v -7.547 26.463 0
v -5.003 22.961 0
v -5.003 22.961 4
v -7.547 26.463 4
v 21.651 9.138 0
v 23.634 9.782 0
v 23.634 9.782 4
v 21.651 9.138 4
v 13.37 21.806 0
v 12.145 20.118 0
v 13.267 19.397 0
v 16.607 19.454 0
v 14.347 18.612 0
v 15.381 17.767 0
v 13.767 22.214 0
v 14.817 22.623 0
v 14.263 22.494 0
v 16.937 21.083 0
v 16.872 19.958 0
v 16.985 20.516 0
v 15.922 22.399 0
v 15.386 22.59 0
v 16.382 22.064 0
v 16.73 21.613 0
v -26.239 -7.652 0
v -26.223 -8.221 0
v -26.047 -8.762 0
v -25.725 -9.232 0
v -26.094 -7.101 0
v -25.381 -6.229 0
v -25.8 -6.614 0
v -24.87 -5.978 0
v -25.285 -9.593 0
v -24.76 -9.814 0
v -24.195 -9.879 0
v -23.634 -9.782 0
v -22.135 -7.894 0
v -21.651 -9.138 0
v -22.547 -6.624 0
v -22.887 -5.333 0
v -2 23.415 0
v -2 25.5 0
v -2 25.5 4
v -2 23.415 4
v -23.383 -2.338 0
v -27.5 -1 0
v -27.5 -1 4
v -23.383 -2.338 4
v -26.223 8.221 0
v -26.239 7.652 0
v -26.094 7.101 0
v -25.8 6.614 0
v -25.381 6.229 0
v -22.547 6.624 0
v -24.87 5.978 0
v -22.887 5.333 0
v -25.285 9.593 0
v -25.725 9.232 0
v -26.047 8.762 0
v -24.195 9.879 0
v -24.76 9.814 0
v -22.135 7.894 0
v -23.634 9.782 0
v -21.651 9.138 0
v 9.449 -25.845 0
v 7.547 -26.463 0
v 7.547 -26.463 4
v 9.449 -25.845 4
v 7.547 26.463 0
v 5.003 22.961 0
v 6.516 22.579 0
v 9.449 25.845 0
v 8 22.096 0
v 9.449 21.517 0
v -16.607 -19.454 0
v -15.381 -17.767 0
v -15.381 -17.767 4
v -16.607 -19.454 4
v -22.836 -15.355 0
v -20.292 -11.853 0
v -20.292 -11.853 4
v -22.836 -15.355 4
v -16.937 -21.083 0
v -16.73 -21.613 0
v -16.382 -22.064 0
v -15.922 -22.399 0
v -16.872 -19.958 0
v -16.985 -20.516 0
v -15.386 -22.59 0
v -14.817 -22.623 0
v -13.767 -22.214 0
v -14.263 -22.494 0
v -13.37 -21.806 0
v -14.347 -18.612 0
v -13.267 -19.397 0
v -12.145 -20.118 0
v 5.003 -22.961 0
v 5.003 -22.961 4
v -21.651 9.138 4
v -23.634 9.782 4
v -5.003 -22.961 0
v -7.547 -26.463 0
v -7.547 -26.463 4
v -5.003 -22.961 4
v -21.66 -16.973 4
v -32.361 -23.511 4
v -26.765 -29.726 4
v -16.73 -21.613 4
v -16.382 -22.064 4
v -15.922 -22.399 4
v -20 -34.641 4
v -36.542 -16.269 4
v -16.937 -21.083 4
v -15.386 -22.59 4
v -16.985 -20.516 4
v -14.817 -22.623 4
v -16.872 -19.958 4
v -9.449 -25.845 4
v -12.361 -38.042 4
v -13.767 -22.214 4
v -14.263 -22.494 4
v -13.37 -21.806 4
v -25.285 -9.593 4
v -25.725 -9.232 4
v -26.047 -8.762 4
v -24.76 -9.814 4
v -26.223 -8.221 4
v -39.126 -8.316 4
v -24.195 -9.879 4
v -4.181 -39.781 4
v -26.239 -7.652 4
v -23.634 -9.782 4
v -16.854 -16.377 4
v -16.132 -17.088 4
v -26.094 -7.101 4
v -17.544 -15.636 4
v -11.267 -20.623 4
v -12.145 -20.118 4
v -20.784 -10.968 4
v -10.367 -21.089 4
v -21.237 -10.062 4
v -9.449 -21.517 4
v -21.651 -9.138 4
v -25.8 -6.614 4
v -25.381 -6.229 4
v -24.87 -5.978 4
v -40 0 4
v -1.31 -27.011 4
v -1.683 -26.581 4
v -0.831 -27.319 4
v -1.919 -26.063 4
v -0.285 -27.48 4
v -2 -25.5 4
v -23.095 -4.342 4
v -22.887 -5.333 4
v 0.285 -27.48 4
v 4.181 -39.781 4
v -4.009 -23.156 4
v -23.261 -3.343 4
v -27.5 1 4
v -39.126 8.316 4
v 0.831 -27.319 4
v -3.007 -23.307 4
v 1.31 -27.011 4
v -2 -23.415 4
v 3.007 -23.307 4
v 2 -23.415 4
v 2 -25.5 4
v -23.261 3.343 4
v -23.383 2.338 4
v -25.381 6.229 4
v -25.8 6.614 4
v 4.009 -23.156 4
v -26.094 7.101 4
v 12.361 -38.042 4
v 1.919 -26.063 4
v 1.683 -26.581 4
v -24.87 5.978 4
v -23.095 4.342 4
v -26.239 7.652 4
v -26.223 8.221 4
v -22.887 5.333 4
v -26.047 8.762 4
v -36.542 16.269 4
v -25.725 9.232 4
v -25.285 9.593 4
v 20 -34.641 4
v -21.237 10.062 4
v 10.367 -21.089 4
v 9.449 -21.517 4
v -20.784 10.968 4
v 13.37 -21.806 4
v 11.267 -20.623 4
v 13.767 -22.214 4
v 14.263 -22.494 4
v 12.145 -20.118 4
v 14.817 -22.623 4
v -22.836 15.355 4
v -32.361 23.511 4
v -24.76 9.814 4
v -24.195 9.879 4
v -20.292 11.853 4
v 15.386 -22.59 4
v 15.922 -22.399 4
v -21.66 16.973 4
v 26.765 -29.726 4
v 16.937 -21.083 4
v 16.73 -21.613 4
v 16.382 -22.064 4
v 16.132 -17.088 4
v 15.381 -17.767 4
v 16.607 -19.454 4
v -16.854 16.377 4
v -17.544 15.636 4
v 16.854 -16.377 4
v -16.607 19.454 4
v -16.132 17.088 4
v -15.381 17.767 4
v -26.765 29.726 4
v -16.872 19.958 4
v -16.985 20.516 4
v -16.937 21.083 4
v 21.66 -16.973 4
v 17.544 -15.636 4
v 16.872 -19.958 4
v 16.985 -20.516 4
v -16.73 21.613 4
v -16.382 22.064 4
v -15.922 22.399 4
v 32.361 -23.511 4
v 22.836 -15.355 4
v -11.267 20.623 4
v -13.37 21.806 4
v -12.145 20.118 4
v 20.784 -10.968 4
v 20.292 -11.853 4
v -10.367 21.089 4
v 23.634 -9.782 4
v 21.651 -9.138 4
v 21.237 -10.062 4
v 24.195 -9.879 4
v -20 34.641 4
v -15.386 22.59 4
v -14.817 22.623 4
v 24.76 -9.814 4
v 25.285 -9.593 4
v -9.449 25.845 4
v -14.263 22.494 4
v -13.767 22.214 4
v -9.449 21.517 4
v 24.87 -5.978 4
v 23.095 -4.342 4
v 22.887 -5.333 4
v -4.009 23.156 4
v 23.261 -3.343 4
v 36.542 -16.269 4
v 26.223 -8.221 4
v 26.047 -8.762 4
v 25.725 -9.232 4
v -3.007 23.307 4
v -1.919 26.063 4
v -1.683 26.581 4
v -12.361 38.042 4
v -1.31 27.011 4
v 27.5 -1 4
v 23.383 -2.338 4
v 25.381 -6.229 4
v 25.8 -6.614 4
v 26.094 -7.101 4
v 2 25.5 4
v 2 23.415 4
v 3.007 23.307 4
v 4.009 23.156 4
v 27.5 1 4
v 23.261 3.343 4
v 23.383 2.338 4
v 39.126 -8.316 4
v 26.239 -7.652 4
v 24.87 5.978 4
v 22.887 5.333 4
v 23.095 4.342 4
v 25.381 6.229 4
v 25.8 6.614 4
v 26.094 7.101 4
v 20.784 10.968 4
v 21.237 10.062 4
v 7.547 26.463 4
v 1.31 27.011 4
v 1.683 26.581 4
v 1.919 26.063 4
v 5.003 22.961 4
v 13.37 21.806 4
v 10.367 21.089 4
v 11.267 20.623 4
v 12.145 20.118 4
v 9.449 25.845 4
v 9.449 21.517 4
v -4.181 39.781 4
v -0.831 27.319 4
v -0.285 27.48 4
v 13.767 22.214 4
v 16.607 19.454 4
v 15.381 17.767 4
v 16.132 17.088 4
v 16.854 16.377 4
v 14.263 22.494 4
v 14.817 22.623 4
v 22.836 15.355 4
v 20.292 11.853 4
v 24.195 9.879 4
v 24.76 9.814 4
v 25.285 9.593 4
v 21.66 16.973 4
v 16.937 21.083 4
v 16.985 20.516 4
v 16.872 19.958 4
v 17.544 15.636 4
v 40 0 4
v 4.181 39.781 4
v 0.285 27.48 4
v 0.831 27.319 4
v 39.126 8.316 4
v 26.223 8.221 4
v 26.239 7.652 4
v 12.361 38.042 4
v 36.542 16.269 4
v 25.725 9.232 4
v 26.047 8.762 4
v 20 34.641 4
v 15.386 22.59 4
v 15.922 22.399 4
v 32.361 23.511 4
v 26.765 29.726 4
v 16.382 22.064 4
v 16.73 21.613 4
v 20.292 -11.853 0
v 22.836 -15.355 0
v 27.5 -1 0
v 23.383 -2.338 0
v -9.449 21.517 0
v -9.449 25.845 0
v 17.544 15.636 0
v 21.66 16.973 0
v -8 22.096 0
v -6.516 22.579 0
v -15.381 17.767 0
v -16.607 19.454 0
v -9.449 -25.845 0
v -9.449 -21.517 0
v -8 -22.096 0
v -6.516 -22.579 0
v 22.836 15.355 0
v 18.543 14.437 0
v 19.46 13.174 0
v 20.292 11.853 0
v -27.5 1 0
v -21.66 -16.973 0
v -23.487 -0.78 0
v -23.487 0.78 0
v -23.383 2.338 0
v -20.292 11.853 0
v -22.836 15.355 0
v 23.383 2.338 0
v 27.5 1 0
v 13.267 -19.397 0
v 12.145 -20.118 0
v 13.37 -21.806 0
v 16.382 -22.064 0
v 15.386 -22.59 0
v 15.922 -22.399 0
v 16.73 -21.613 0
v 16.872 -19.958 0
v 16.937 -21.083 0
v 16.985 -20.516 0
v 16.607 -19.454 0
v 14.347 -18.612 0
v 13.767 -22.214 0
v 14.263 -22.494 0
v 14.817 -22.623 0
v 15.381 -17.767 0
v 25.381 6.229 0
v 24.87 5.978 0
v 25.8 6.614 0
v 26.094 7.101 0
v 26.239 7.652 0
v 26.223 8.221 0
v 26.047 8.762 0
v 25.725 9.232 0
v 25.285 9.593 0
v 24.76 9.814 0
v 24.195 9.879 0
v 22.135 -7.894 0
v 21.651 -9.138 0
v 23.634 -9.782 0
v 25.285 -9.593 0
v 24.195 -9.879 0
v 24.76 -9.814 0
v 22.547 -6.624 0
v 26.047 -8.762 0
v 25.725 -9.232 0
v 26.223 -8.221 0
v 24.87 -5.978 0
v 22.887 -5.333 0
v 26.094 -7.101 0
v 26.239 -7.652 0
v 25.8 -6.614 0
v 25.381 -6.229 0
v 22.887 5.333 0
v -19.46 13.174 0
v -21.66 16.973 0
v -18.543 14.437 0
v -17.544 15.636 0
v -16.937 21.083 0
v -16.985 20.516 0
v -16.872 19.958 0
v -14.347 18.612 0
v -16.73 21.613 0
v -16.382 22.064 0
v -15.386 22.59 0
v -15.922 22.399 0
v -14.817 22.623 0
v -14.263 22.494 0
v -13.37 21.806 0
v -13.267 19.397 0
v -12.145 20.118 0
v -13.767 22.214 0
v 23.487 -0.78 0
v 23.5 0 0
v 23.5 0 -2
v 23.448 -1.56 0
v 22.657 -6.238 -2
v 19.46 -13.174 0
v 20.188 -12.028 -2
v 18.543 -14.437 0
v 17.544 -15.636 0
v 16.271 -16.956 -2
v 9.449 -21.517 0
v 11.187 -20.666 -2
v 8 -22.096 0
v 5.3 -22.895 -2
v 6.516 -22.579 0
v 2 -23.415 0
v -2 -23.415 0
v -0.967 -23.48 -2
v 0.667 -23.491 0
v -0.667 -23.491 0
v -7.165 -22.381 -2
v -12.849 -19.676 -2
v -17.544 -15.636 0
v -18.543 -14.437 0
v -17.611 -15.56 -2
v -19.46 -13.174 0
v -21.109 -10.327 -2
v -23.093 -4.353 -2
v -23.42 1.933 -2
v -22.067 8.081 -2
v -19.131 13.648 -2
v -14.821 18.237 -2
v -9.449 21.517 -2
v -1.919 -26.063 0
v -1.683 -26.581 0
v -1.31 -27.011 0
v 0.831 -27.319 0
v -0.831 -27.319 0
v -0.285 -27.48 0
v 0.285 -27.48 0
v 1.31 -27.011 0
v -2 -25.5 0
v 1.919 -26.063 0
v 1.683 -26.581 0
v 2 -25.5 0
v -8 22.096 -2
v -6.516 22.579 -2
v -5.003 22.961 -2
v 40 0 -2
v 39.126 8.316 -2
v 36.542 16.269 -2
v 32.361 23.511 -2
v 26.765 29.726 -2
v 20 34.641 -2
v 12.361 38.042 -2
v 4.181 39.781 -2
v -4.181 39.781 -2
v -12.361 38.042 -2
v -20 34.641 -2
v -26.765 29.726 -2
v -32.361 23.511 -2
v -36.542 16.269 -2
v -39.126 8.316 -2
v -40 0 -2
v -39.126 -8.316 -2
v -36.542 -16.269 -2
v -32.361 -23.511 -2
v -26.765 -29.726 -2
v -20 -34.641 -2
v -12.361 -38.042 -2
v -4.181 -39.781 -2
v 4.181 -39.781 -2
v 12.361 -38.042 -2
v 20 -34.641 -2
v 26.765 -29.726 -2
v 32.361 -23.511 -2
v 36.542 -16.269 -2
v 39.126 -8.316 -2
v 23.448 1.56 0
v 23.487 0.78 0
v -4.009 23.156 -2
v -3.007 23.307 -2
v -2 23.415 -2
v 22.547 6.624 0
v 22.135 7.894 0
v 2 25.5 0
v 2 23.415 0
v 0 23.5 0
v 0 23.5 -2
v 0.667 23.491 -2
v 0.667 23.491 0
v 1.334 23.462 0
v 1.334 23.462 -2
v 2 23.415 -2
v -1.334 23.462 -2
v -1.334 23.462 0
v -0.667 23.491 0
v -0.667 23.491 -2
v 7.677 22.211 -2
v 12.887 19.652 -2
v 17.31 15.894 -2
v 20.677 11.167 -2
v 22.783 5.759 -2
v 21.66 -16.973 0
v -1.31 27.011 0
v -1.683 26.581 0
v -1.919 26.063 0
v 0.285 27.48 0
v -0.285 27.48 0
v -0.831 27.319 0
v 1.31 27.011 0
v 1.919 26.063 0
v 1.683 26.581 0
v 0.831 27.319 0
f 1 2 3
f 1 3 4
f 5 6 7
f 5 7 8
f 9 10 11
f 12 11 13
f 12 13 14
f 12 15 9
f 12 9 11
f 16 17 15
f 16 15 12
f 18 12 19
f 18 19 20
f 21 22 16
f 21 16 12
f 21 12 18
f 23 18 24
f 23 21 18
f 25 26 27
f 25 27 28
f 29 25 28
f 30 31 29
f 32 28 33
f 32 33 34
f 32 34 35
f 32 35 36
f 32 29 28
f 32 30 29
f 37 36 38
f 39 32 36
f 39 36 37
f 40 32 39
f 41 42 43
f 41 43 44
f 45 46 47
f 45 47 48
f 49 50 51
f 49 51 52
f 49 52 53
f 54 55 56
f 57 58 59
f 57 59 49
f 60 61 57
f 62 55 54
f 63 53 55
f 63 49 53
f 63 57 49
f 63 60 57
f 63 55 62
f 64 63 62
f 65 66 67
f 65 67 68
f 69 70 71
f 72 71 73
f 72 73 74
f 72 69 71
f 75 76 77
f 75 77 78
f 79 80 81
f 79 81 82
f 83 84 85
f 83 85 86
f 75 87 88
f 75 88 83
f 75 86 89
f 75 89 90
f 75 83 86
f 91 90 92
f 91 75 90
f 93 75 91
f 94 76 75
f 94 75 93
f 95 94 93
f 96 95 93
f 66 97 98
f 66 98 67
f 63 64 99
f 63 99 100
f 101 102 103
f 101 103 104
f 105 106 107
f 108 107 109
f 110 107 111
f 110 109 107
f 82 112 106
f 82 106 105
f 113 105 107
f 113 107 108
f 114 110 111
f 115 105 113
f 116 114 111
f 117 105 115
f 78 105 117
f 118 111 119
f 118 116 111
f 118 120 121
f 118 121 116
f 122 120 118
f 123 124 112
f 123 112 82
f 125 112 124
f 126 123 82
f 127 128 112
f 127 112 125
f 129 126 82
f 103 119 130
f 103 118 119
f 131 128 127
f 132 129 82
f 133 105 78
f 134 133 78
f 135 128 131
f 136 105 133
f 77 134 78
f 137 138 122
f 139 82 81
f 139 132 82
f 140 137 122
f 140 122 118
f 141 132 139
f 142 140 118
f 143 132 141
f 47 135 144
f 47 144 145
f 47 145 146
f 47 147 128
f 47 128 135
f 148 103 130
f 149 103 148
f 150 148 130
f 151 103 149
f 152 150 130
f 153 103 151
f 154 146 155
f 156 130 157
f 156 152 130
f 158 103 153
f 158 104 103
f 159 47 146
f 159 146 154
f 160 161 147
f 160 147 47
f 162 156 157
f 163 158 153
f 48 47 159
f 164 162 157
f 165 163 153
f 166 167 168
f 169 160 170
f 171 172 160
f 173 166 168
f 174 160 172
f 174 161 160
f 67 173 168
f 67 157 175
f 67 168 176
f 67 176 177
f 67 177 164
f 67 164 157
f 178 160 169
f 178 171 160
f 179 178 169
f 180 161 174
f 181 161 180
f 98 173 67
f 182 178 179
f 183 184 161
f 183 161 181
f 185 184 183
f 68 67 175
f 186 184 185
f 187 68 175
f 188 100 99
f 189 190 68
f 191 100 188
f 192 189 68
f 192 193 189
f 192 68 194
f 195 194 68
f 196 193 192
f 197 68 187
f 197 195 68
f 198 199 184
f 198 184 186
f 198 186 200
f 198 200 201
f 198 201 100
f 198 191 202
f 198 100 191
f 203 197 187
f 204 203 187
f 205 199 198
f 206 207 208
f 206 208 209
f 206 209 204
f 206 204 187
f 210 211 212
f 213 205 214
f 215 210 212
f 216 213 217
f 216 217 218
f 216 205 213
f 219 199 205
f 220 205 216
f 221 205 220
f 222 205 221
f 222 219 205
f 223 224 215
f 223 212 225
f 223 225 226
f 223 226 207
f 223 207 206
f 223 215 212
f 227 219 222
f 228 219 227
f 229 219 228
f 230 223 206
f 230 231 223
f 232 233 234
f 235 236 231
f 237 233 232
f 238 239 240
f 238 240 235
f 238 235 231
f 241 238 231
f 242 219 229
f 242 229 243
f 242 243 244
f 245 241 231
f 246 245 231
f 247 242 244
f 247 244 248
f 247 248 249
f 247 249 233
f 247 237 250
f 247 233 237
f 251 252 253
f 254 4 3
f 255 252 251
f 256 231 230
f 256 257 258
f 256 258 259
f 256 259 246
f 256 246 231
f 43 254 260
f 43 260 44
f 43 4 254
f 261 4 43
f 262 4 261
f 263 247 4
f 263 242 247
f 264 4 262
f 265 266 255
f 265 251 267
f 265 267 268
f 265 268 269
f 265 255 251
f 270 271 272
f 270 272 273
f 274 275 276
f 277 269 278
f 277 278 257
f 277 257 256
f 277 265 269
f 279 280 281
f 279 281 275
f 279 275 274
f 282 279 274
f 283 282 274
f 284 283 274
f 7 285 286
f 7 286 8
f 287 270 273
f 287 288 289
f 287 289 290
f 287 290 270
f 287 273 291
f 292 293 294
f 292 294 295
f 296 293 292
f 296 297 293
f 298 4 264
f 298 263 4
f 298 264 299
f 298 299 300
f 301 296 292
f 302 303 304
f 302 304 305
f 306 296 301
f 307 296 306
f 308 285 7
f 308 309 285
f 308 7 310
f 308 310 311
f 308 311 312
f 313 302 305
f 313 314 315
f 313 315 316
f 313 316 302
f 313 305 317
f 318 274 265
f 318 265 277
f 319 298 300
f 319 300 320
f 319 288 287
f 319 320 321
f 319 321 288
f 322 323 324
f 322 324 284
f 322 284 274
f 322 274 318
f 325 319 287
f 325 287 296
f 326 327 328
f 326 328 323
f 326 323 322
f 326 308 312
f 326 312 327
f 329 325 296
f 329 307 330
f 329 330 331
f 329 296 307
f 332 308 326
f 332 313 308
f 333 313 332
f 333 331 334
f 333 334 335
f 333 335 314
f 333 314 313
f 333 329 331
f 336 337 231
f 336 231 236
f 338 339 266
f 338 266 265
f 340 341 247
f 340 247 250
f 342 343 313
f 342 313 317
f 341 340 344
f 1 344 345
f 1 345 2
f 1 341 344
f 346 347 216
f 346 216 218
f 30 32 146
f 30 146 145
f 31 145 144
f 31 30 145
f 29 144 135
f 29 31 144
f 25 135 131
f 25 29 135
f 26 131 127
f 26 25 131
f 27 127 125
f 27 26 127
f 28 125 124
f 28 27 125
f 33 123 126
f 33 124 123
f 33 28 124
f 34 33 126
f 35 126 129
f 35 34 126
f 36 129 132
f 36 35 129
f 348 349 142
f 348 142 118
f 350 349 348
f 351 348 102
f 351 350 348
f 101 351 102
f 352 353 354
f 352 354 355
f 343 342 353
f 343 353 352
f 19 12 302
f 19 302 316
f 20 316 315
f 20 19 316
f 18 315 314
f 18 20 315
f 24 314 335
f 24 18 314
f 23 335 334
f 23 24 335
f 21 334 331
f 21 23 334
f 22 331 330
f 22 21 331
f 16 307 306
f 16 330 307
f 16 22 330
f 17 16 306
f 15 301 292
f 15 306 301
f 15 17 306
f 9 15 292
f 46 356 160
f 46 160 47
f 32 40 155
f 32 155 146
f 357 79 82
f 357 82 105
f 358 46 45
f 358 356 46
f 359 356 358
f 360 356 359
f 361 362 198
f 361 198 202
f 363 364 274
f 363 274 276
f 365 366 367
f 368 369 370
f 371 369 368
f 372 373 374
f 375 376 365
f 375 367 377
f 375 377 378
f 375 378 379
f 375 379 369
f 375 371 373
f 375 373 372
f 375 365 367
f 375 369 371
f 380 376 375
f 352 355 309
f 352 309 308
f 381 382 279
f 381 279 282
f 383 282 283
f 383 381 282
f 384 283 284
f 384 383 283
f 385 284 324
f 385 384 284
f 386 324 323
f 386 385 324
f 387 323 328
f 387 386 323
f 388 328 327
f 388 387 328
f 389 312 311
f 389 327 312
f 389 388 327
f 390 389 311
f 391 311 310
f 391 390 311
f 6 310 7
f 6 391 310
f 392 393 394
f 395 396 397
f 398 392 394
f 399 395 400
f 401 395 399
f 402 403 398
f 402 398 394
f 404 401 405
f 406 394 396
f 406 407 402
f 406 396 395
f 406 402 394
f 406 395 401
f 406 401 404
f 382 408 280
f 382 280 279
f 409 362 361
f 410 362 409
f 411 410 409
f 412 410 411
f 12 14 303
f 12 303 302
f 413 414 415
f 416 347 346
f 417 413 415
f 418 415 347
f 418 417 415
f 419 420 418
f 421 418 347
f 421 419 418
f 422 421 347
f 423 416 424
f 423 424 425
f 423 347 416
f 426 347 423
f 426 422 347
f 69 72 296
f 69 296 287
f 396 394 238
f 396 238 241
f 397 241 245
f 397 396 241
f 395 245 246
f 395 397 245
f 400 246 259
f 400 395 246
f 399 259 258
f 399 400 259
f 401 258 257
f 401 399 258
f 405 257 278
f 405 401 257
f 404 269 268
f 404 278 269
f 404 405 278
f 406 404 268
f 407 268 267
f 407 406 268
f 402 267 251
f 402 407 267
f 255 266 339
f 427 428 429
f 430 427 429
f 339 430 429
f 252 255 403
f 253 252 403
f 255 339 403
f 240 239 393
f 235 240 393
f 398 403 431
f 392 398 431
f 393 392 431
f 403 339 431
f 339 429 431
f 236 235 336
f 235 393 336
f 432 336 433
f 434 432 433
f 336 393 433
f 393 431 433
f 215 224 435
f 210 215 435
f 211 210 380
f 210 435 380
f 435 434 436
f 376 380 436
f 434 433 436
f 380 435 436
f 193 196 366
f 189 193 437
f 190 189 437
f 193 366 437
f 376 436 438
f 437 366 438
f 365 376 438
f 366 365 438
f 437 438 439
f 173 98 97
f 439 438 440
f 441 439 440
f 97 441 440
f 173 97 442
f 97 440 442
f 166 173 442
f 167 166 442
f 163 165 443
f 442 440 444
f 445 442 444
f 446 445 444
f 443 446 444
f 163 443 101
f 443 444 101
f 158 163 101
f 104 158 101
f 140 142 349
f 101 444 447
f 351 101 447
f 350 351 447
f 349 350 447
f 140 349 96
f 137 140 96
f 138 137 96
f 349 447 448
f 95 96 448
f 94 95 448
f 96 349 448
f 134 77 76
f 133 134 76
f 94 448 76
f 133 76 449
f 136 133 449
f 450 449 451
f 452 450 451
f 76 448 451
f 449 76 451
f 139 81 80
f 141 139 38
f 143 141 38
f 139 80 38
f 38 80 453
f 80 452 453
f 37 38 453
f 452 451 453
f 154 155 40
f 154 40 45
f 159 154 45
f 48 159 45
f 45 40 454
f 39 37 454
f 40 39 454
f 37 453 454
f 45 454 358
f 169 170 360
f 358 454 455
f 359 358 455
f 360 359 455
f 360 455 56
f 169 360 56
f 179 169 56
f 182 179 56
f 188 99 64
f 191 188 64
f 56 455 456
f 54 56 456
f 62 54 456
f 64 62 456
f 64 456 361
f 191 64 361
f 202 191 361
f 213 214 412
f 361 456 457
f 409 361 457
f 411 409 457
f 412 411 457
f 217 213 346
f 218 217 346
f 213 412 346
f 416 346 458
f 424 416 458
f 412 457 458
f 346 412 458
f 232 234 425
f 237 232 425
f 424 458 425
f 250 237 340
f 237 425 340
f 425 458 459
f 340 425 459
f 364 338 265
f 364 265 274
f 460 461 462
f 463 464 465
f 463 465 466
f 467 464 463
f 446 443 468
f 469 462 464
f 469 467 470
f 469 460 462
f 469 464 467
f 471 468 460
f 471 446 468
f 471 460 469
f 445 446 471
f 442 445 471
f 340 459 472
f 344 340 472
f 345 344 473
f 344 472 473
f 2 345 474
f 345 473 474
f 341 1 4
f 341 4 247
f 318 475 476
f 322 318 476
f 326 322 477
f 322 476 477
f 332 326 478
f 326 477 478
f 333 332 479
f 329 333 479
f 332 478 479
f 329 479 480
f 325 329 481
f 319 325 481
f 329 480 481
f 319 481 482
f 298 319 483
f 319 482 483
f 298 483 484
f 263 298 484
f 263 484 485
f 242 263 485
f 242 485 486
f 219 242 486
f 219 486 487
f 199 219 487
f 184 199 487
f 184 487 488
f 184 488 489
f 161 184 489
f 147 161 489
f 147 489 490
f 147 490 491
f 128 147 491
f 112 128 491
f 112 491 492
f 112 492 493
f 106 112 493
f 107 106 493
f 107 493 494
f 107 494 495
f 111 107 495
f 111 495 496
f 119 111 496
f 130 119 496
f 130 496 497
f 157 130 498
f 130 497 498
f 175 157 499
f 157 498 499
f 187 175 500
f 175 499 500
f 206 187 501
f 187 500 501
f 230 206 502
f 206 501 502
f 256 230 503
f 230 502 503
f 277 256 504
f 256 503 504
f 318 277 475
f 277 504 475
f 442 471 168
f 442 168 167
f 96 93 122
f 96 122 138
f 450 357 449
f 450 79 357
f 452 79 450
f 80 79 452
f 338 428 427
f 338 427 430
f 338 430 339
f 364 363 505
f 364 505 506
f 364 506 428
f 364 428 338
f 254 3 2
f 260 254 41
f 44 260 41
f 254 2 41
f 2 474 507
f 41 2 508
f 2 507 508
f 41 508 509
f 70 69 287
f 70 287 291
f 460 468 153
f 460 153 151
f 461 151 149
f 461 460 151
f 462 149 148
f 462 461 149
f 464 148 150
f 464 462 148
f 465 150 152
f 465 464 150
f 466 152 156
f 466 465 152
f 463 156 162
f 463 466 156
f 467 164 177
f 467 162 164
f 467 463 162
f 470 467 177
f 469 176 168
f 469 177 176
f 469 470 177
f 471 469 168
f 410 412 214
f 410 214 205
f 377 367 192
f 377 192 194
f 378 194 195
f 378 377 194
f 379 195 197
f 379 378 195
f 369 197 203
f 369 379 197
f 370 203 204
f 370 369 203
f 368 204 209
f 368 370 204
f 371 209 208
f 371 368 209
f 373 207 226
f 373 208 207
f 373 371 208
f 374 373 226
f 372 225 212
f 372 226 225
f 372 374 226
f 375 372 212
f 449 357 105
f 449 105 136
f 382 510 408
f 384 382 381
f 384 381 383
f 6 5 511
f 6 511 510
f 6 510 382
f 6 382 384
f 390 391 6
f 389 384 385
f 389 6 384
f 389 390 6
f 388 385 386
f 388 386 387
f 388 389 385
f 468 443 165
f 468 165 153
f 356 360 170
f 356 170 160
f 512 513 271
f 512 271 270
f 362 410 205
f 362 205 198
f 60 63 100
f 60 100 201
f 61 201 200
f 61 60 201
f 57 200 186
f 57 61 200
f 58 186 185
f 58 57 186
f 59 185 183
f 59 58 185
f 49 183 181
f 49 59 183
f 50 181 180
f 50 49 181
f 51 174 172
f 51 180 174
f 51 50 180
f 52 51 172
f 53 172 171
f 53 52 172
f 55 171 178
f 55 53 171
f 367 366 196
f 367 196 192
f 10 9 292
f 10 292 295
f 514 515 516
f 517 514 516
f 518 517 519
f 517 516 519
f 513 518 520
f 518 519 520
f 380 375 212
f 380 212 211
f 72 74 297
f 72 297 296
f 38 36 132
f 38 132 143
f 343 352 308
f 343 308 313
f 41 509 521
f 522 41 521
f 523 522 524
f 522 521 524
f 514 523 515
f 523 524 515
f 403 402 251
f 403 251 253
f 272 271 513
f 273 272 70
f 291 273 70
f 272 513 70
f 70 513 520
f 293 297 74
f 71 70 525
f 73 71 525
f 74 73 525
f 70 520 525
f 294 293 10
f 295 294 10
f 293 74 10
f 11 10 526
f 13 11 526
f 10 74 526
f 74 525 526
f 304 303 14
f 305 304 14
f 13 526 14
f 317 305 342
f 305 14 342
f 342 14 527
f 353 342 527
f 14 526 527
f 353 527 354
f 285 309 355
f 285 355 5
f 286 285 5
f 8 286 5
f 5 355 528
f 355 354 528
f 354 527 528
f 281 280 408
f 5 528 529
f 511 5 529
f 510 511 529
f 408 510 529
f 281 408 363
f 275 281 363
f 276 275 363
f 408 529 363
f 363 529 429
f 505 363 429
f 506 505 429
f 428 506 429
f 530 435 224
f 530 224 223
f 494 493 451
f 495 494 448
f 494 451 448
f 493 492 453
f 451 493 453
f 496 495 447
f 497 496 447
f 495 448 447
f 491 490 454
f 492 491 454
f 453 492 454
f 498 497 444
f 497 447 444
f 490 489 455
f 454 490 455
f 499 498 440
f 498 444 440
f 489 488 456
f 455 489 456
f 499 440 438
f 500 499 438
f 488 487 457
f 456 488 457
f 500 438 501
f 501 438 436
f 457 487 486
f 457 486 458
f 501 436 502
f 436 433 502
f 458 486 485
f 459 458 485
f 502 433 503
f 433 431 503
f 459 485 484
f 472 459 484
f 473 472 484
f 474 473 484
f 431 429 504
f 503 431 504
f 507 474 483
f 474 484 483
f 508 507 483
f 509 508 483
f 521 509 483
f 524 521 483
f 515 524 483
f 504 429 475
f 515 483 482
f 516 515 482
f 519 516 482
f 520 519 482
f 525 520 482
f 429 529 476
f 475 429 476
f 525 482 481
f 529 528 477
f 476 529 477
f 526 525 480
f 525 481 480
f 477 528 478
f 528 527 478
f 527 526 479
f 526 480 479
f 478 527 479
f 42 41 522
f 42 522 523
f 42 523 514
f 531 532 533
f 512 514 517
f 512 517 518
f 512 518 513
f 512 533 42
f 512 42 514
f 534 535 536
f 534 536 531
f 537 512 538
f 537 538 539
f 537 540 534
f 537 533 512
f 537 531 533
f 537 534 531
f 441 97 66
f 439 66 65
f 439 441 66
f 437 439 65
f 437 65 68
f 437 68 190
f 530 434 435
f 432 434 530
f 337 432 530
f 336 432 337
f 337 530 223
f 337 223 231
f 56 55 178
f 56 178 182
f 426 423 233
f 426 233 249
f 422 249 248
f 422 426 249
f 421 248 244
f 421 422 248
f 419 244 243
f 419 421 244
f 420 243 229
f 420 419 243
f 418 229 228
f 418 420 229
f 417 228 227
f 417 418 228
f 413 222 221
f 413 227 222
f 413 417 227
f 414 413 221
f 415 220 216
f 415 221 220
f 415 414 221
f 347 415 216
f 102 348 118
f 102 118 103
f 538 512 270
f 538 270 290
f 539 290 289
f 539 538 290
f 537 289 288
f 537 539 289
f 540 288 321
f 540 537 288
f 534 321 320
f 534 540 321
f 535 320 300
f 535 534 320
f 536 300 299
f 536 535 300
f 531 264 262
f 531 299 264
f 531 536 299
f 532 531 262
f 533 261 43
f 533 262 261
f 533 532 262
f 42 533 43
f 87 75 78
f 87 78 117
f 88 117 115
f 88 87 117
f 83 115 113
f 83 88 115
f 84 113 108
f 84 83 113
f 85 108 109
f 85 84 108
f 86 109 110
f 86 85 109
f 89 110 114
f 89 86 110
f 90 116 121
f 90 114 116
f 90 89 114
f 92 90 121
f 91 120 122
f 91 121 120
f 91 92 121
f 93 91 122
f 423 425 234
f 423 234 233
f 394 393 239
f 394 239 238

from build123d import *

# Parameters (mm, degrees)
SKETCH2_R           = 40
SKETCH2_R_2         = 23.5
BOSS_EXTRUDE1_DEPTH = 4
CUT_EXTRUDE2_DEPTH  = 10
CIRPATTERN1_COUNT   = 10
BOSS_EXTRUDE2_START = -2
SKETCH2_4_R         = 40
SKETCH2_4_R_2       = 23.5
BOSS_EXTRUDE2_DEPTH = 2


with BuildPart() as part:
    # Sketch2 → Boss-Extrude1 (new body)
    with BuildSketch(Plane.XY):
        Circle(SKETCH2_R)
        Circle(SKETCH2_R_2, mode=Mode.SUBTRACT)
    extrude(amount=BOSS_EXTRUDE1_DEPTH)

    # Sketch2<3> → Cut-Extrude2 (cut)
    with BuildSketch(Plane.XY):
        with BuildLine():
            Line((-7.546910829, 26.463071192), (-9.449023862, 25.845037204))
            Line((-9.449023862, 25.845037204), (-9.449023862, 21.516643513))
            ThreePointArc((-9.449023862, 21.516643513), (-7.261899368, 22.349828133), (-5.002744851, 22.961327138))
            Line((-5.002744851, 22.961327138), (-7.546910829, 26.463071192))
        make_face()
        with BuildLine():
            Line((-2, 25.5), (-2, 23.414738948))
            ThreePointArc((-2, 23.414738948), (0, 23.5), (2, 23.414738948))
            Line((2, 23.414738948), (2, 25.5))
            ThreePointArc((2, 25.5), (0, 27.5), (-2, 25.5))
        make_face()
    cut_extrude2 = extrude(amount=CUT_EXTRUDE2_DEPTH, mode=Mode.SUBTRACT)

    # CirPattern1: Cut-Extrude2 ×10 about axis
    cirpattern1_axis = Axis((0, 0, 0), (0, 0, 1))
    for i in range(1, CIRPATTERN1_COUNT):
        add(cut_extrude2.rotate(cirpattern1_axis, i * 360 / CIRPATTERN1_COUNT), mode=Mode.SUBTRACT)

    # Sketch2<4> → Boss-Extrude2 (add)
    with BuildSketch(Plane.XY.offset(BOSS_EXTRUDE2_START)):
        Circle(SKETCH2_4_R)
        Circle(SKETCH2_4_R_2, mode=Mode.SUBTRACT)
    extrude(amount=BOSS_EXTRUDE2_DEPTH)


solid = part.part
